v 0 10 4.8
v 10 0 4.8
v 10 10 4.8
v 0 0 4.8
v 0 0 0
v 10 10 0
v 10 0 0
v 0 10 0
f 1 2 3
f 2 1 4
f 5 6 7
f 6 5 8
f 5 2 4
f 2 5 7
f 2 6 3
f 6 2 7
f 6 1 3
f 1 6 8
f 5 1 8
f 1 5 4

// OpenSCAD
front_panel_thickness=2;
cut=200;
container_wall_thickness=1;
$fn=50;

front_panel_height=100;
front_panel_width=50;

module ccube(size = [1,1,1], center = false)
{
  sz = (len(size) == 3)?size:[size,size,size];
  if (len(center) == 1)
    cube(size, center);
  else
    translate([center[0]?-sz[0]/2:0,center[1]?-sz[1]/2:0,center[2]?-sz[2]/2:0])
    cube(size);
}


module front_panel() {
	difference() {
		union() {
			ccube([front_panel_height, front_panel_width, front_panel_thickness], center=[1, 1, 0]);
			translate([0, 0, -4]) {
				translate([front_panel_height/2 - 5 - container_wall_thickness, -front_panel_width/2 + container_wall_thickness]) cube(5);
				translate([front_panel_height/2 - 5 - container_wall_thickness, front_panel_width/2 - container_wall_thickness - 5]) cube(5);
				translate([-front_panel_height/2 + container_wall_thickness, -front_panel_width/2 + container_wall_thickness]) cube(5);
				translate([-front_panel_height/2 + container_wall_thickness, front_panel_width/2 - container_wall_thickness - 5]) cube(5);
			}
		}
		translate([0, 0, -1]) union() {
			translate([0, front_panel_width/3]) ccube([55, 6, cut], center=[1, 1, 0]);
			translate([0, -front_panel_width/3]) for ( i = [1 : 8] ){
		    translate([10*i - front_panel_height/2 + 5, 0])
		    cylinder(d = 3, h=cut);
			}
		}
	}
}

module back_panel() {
	difference() {
		union() {
			ccube([front_panel_height, front_panel_width, 50+container_wall_thickness], center=[0, 1, 0]);
		}
		union() {
			translate([container_wall_thickness, 0, container_wall_thickness]) ccube([front_panel_height-2*container_wall_thickness, front_panel_width-2*container_wall_thickness, cut], center=[0, 1, 0]);
			translate([front_panel_height/2, 0, -1]) cylinder(d=10, h=cut);
			translate([-1, 0, container_wall_thickness+7]) rotate([0, 90, 0]) cylinder(d=12, h=cut);
			// Holes for M3 bolts
			translate([0, 0, -1]) {
				translate([container_wall_thickness + 5, -front_panel_width/2 + container_wall_thickness + 5]) cylinder(d=3.5, h=cut);
				translate([container_wall_thickness + 5, front_panel_width/2 - container_wall_thickness - 5]) cylinder(d=3.5, h=cut);
				translate([front_panel_height-container_wall_thickness-5, -front_panel_width/2 + container_wall_thickness + 5]) cylinder(d=3.5, h=cut);
				translate([front_panel_height-container_wall_thickness-5, front_panel_width/2 - container_wall_thickness - 5]) cylinder(d=3.5, h=cut);
			}
		}
	}
	translate([container_wall_thickness+13, 0]) ccube([5, 10, container_wall_thickness+10], center=[0, 1, 0]);
}

/* front_panel(); */
/* back_panel(); */

// plate to insert between button and main case
cube([10, 10, 4.8]);
